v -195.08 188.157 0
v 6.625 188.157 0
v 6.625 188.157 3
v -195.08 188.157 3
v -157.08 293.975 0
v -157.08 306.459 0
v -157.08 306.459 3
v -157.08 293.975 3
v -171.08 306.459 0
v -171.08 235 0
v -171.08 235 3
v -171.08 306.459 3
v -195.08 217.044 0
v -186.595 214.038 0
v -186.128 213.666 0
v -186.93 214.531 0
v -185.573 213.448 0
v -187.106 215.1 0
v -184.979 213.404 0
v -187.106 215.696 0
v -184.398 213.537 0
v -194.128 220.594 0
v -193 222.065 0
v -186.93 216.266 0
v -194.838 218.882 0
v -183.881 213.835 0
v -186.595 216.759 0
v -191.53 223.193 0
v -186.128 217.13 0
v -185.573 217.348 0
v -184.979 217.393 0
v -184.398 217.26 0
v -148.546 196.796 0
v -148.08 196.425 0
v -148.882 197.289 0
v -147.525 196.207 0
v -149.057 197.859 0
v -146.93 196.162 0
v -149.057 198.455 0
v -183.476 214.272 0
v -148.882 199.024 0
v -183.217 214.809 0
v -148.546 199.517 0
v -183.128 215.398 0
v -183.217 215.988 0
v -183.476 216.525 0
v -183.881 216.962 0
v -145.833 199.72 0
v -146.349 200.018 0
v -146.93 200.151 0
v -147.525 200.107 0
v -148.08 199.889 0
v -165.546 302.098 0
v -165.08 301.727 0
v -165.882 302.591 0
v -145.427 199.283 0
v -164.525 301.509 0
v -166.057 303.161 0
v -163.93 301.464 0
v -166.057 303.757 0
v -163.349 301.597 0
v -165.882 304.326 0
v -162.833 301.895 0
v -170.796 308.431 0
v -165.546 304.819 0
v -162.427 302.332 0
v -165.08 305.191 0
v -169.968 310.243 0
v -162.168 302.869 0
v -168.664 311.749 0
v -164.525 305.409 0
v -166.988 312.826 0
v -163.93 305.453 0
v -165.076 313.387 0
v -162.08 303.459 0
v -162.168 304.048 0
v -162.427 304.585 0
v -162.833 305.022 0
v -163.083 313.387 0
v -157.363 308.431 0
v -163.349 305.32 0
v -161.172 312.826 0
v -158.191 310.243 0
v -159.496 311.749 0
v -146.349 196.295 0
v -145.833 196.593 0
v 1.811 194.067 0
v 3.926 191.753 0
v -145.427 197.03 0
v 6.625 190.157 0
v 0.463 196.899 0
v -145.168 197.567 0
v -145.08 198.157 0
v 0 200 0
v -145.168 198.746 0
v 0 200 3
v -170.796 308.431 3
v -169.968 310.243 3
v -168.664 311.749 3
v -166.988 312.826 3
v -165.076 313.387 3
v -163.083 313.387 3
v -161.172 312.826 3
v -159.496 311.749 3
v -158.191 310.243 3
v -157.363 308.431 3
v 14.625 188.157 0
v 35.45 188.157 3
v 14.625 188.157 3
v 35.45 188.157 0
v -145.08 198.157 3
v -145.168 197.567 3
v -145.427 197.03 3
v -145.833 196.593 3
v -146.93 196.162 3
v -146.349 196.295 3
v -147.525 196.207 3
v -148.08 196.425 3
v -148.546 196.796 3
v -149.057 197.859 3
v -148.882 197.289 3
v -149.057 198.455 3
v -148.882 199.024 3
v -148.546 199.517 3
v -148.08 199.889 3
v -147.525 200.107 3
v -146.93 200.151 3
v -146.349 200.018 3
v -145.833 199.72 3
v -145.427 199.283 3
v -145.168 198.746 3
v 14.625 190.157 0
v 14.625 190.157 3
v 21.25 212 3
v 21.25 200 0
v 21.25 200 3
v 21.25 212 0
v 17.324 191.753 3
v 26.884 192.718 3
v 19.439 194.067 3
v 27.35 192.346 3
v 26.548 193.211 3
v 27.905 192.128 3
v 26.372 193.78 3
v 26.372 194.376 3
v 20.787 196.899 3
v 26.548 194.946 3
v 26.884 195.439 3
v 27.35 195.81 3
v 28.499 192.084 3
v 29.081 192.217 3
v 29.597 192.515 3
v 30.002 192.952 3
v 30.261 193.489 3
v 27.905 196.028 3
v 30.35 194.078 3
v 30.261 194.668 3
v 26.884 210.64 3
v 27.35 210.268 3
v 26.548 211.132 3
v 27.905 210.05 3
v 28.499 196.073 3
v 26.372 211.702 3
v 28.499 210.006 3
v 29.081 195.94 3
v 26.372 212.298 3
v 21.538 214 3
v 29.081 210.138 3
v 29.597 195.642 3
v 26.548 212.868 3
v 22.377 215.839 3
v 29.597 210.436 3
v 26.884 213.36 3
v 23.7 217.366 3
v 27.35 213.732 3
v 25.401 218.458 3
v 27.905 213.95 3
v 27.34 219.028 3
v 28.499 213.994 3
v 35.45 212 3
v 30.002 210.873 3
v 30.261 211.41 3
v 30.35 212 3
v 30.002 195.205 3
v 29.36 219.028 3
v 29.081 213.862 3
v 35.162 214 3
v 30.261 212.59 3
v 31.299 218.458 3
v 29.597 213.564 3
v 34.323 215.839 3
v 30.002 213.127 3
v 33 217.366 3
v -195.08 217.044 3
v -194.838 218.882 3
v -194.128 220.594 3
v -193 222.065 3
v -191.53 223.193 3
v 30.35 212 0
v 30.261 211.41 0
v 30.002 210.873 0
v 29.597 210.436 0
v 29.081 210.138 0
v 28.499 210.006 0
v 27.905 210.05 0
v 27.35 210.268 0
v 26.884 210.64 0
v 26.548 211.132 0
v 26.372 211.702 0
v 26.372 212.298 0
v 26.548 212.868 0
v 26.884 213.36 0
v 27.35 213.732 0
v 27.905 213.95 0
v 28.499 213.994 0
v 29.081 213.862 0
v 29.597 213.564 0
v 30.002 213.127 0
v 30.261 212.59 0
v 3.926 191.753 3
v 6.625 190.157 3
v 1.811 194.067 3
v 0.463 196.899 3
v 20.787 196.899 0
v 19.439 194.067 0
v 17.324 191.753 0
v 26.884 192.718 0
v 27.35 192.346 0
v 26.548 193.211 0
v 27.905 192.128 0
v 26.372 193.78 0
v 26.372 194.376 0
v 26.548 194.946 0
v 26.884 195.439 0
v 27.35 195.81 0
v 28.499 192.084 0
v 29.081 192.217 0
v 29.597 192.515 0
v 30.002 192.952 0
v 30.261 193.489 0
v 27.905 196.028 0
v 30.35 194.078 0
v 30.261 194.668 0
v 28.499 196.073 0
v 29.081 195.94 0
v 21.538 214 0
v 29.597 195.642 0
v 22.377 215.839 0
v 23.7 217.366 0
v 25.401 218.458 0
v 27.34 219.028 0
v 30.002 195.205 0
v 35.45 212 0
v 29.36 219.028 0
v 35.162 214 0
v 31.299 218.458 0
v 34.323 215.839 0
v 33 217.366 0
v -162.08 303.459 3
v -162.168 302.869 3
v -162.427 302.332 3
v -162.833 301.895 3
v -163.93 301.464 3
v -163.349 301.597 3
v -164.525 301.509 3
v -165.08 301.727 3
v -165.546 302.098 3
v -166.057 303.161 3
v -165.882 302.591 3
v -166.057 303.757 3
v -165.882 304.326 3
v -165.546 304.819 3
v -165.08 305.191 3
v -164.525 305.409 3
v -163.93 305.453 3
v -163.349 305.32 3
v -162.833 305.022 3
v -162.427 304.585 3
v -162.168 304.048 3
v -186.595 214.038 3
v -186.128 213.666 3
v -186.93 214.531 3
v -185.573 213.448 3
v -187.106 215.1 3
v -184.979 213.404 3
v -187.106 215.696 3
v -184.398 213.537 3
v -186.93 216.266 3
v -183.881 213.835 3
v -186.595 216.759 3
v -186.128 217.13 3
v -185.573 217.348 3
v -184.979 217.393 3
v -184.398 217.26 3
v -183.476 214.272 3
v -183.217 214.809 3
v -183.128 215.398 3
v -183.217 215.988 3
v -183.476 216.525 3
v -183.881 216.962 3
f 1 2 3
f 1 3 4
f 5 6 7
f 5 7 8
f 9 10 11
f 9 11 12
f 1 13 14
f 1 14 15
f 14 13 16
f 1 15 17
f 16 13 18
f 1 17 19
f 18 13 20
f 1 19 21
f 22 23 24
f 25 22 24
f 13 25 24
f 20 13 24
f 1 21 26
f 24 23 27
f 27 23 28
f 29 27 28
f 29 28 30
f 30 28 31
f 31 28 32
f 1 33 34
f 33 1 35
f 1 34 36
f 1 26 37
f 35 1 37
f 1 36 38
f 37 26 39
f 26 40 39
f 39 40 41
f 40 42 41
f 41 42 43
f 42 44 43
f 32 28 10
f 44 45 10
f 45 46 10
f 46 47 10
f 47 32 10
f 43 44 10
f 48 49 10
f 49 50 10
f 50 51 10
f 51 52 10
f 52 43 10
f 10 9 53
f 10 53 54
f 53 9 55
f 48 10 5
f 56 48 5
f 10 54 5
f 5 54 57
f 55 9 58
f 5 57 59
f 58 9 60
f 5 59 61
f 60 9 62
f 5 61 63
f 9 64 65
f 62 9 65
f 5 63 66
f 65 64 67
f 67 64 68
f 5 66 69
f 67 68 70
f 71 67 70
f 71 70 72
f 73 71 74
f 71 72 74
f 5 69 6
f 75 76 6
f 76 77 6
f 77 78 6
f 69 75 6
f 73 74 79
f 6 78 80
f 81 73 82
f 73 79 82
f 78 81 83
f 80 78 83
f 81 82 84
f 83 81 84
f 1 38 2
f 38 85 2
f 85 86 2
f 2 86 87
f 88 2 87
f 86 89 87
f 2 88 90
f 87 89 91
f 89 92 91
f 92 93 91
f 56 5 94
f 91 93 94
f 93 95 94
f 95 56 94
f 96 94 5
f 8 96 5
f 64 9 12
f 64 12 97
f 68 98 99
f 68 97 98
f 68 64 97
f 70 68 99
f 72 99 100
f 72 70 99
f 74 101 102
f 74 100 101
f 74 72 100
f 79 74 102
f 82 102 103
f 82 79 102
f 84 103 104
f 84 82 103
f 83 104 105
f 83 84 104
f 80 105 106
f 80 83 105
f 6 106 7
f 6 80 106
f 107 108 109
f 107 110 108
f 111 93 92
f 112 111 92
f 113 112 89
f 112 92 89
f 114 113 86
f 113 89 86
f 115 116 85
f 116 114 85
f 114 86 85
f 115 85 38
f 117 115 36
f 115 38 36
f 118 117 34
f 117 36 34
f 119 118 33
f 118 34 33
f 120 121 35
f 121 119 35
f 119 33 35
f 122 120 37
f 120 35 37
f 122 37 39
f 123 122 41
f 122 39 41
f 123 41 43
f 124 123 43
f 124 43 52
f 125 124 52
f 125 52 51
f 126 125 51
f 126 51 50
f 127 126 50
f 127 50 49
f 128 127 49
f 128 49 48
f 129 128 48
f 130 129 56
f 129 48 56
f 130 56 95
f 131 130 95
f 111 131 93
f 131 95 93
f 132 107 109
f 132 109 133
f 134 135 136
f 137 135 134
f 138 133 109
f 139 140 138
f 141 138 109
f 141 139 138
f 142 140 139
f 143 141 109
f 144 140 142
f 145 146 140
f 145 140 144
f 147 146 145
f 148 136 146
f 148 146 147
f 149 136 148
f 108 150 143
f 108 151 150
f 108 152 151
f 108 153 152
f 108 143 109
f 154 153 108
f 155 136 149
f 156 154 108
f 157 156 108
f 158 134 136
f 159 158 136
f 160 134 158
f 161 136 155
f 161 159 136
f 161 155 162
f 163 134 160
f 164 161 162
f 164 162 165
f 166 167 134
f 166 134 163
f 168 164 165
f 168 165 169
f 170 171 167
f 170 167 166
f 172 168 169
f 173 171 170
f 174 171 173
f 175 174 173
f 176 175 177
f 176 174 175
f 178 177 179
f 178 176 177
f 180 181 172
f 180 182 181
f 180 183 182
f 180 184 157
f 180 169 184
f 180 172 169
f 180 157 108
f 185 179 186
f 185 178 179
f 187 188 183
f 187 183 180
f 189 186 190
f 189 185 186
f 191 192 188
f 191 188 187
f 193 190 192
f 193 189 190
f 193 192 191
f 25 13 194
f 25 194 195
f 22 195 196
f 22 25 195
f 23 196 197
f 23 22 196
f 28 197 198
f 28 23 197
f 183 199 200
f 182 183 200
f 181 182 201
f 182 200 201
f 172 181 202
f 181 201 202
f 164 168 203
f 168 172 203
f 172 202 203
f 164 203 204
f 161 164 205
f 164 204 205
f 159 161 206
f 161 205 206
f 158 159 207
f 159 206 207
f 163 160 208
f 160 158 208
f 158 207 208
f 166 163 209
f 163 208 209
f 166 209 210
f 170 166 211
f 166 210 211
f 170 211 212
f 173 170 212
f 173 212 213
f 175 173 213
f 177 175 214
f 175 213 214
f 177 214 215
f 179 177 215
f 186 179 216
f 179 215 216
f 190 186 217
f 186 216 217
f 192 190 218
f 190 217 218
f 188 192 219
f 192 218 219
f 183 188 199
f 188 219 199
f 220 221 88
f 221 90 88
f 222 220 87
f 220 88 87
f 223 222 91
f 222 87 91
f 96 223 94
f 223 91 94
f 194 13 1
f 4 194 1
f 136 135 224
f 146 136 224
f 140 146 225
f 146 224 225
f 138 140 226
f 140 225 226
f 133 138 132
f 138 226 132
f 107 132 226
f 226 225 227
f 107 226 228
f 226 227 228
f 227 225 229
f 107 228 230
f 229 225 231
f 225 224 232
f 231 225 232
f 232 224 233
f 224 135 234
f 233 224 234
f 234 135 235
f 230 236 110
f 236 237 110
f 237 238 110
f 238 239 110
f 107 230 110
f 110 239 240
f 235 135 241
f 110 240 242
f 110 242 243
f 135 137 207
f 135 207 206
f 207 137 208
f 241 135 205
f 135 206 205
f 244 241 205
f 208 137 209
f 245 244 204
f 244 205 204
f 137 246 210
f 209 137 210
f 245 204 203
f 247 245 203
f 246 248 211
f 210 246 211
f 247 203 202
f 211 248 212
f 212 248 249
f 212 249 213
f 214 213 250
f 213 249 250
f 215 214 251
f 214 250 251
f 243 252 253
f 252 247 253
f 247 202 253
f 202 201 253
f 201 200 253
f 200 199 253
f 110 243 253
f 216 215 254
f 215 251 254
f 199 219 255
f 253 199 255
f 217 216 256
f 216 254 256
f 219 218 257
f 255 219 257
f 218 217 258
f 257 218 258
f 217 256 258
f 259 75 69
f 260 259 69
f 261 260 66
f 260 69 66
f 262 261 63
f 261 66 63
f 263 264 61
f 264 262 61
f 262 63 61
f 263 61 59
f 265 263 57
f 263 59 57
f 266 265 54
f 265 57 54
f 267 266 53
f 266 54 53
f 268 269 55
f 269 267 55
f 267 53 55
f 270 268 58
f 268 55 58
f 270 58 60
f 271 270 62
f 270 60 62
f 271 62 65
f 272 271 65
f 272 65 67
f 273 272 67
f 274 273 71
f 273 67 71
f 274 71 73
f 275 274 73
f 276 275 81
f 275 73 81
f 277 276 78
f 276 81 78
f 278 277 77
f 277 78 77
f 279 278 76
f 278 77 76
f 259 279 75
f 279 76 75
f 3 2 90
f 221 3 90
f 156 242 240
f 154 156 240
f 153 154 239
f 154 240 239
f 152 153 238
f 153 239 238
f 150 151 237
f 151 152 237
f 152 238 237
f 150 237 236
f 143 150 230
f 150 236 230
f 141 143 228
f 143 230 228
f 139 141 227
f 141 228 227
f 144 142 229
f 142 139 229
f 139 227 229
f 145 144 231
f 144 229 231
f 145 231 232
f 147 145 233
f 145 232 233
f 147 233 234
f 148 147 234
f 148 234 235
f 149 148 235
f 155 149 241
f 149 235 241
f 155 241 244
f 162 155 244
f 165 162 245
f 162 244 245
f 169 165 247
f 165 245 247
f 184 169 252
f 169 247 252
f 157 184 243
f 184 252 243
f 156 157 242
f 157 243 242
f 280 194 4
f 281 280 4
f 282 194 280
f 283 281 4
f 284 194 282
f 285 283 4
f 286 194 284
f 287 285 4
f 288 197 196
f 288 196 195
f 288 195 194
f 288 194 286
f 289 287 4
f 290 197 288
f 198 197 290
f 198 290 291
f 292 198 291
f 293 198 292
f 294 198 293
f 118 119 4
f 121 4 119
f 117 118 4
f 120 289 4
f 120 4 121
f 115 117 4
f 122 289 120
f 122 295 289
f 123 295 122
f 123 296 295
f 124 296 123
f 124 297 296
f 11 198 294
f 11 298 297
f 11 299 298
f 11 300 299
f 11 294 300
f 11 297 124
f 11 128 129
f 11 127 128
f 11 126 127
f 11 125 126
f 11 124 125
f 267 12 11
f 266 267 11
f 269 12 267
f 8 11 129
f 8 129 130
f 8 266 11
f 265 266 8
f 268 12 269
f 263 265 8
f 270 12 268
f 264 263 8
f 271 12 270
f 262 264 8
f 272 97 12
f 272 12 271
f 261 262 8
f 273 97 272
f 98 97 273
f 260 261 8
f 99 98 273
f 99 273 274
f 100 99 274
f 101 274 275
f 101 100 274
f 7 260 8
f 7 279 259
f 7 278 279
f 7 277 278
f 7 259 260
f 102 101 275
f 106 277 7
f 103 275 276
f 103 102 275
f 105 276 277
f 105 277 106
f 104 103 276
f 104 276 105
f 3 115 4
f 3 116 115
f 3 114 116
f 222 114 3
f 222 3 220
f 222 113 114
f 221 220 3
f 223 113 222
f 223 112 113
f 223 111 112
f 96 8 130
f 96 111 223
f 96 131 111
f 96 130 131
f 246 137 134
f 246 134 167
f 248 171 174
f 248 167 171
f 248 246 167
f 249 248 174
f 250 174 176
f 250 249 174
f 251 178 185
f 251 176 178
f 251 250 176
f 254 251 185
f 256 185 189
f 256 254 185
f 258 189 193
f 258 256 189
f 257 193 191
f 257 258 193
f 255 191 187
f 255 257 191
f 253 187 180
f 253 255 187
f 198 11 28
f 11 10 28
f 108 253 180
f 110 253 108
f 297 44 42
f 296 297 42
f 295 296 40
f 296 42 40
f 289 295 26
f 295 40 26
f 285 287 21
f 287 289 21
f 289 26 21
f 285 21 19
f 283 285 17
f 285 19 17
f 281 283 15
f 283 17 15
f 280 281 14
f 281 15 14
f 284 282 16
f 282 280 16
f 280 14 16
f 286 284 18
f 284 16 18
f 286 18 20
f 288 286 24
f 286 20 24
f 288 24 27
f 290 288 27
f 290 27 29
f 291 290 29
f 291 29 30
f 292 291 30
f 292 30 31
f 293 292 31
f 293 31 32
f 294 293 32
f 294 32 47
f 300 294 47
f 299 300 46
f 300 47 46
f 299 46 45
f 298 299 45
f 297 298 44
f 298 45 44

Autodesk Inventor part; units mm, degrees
ref_plane "YZ Plane" through (0, 0, 0) normal (1, 0, 0) x (0, 1, 0)
ref_plane "XZ Plane" through (0, 0, 0) normal (0, 1, 0) x (-1, 0, 0)
ref_plane "XY Plane" through (0, 0, 0) normal (0, 0, 1) x (1, 0, 0)
sketch "Sketch3" plane through (0, 0, 0) normal (0, 0, 1) x (1, 0, 0)
  circle A0 centre (367.816, 50) radius 50 construction
  line L0 (367.816, 0) -> (512.7041, 0) construction
  line L1 (367.816, 50) -> (512.7041, 50) construction
  line L2 (367.816, 100) -> (512.7041, 100) construction
  line L3 (367.816, 50) -> (342.816, 6.6987) construction
  line L4 (367.816, 50) -> (324.5147, 25) construction
  line L5 (367.816, 50) -> (324.5147, 75) construction
  line L6 (342.816, 93.3013) -> (367.816, 50) construction
  line L7 (392.816, 93.3013) -> (367.816, 50) construction
  line L8 (411.1173, 75) -> (367.816, 50) construction
  line L9 (411.1173, 25) -> (367.816, 50) construction
  line L10 (392.816, 6.6987) -> (367.816, 50) construction
  line L11 (367.816, 0) -> (367.816, 100) construction
  line L12 (417.816, 50) -> (367.816, 50) construction
  line L13 (341.6361, 0) -> (341.6361, 100) construction
  line L14 (315.4561, 0) -> (315.4561, 100) construction
  line L15 (289.2762, 0) -> (289.2762, 100) construction
  line L16 (263.0963, 0) -> (263.0963, 100) construction
  line L17 (236.9163, 0) -> (236.9163, 100) construction
  line L18 (210.7364, 0) -> (210.7364, 100) construction
  line L19 (184.5564, 0) -> (184.5564, 100) construction
  line L20 (158.3765, 0) -> (158.3765, 100) construction
  circle A1 centre (315.4561, 50) radius 50 construction
  circle A2 centre (341.6361, 50) radius 50 construction
  circle A3 centre (289.2762, 50) radius 50 construction
  circle A4 centre (263.0963, 50) radius 50 construction
  circle A5 centre (236.9163, 50) radius 50 construction
  circle A6 centre (210.7364, 50) radius 50 construction
  line L21 (392.816, 6.6987) -> (512.7041, 6.6987) construction
  line L22 (411.1173, 25) -> (512.7041, 25) construction
  line L23 (411.1173, 75) -> (512.7041, 75) construction
  line L24 (411.1173, 75) -> (512.7041, 75) construction
  line L25 (392.816, 93.3013) -> (512.7041, 93.3013) construction
  line L26 (358.7574, 75) -> (339.2762, 50) construction
  line L27 (339.2762, 50) -> (306.3975, 25) construction
  line L28 (306.3975, 25) -> (261.9163, 6.6987) construction
  line L29 (261.9163, 6.6987) -> (210.7364, 0) construction
  line L30 (105.3682, -12.9392) -> (105.3682, 124.4333) construction
  line L31 (21.25, 0) -> (21.25, 12)
  line L32 (35.45, 12) -> (35.45, -11.8433)
  arc A7 (0, 0) -> (6.625, -9.8433) centre (10.625, 0) ccw
  arc A8 (14.625, -9.8433) -> (21.25, 0) centre (10.625, 0) ccw
  line L33 (35.45, -11.8433) -> (14.625, -11.8433)
  line L34 (6.625, -11.8433) -> (-195.0796, -11.8433)
  circle A9 centre (-144.26, 100.8473) radius 12.875 construction
  line L35 (6.625, -11.8433) -> (6.625, -9.8433)
  line L36 (14.625, -11.8433) -> (14.625, -9.8433)
  line L37 (411.1173, 75) -> (158.3765, 75) construction
  line L38 (367.816, 100) -> (158.3765, 100) construction
  line L39 (417.816, 50) -> (158.3765, 50) construction
  line L40 (411.1173, 25) -> (158.3765, 25) construction
  line L41 (392.816, 6.6987) -> (158.3765, 6.6987) construction
  line L42 (392.816, 93.3013) -> (158.3765, 93.3013) construction
  line L43 (358.7574, 75) -> (366.6361, 93.3013) construction
  line L44 (366.6361, 93.3013) -> (367.816, 100) construction
  spline S0 degree 4 poles (-157.0796, 100) (-157.0796, 88.9946) (-147.011, 72.6811) (-131.8577, 48.7932) (-88.4777, 17.6268) (-50.0176, 3.937) (-18.8717, 0) (0, 0) knots 0 0 0 0 0 0.264547 0.457223 0.66608 1 1 1 1 1
  line L45 (-157.0796, 100) -> (-157.0796, 38) construction
  line L46 (0, 0) -> (-157.0796, 0) construction
  line L47 (-144.26, 100.8473) -> (-157.135, 100.8473) construction
  circle A10 centre (-146.4546, 100) radius 10.625 construction
  line L48 (-146.4546, 100) -> (-157.0796, 100) construction
  line L49 (-141.0754, 84.4005) -> (-135.6205, 93.5183) construction
  line L50 (-141.0796, 132.0528) -> (-171.0796, 149.3733) construction
  line L51 (-171.0796, 149.3733) -> (-201.0796, 132.0528) construction
  line L52 (-141.0754, 84.4005) -> (-99.2801, 84.4005) construction
  line L53 (-201.0796, 132.0528) -> (-201.0796, 97.4118) construction
  line L54 (-201.0796, 97.4118) -> (-171.0796, 80.0913) construction
  line L55 (0, 0) -> (-157.0796, 93.9753) construction
  line L56 (-135.6205, 93.5183) -> (-137.3368, 94.5451) construction
  line L57 (-137.3368, 94.5451) -> (-143.2815, 84.6085) construction
  line L58 (-137.3368, 94.5451) -> (-171.0796, 114.7323) construction
  line L59 (-201.0796, 132.0528) -> (-171.0796, 114.7323) construction
  arc A11 (-137.3368, 94.5451) -> (-144.7045, 143.8948) centre (-171.0796, 114.7323) ccw construction
  arc A12 (-142.7917, 85.4273) -> (-147.1443, 147.6882) centre (-171.0796, 114.7323) ccw construction
  line L60 (-171.0796, 80.0913) -> (-171.0796, 35)
  circle A13 centre (-171.0796, 114.7323) radius 2.5 construction
  arc A14 (-167.4345, 120.8251) -> (-174.7248, 108.6394) centre (-171.0796, 114.7323) ccw construction
  line L61 (-167.4345, 120.8251) -> (-157.0796, 114.6302) construction
  line L62 (-171.0796, 80.0913) -> (-171.0796, 106.4587)
  line L63 (-171.0796, 106.4587) -> (-174.7248, 108.6394) construction
  line L64 (-171.0796, 35) -> (-191.5296, 23.1932)
  arc A15 (-191.5296, 23.1932) -> (-195.0796, 17.0444) centre (-187.9796, 17.0444) ccw
  line L65 (-195.0796, 17.0444) -> (-195.0796, -11.8433)
  arc A16 (35.45, 12) -> (21.25, 12) centre (28.35, 12) ccw
  line L66 (-157.0796, 114.6302) -> (-157.0796, 99.9865) construction
  circle A17 centre (-164.0796, 103.4587) radius 2
  line L67 (-171.0796, 103.4587) -> (-157.0796, 103.4587) construction
  circle A18 centre (-185.1284, 15.3983) radius 2
  line L68 (-185.1284, 15.3983) -> (-194.1284, 20.5944) construction
  circle A19 centre (-6, -5.9217) radius 2
  line L69 (-6, -11.8433) -> (-6, 0) construction
  circle A20 centre (28.35, 12) radius 2
  circle A21 centre (28.35, -5.9217) radius 2
  line L70 (-167.4345, 320.8251) -> (-157.0796, 314.6302) construction
  arc A22 (-167.4345, 320.8251) -> (-174.7248, 308.6394) centre (-171.0796, 314.7323) ccw construction
  circle A23 centre (-171.0796, 314.7323) radius 2.5 construction
  line L71 (-171.0796, 280.0913) -> (-171.0796, 306.4587)
  line L72 (-171.0796, 306.4587) -> (-174.7248, 308.6394) construction
  line L73 (-157.0796, 314.6302) -> (-157.0796, 299.9865) construction
  circle A24 centre (-164.0796, 303.4587) radius 2
  spline S1 degree 4 poles (-157.0796, 300) (-157.0796, 288.9946) (-147.0234, 272.6841) (-124.1789, 236.7977) (-70.8039, 208.0704) (-31.8865, 200.2943) (0, 200) knots 0 0 0 0 0 0.264547 0.457223 1 1 1 1 1 construction
  line L74 (-157.0796, 300) -> (-157.0796, 238) construction
  arc A25 (0, 200) -> (6.625, 190.1567) centre (10.625, 200) ccw
  line L75 (35.45, 212) -> (35.45, 188.1567)
  circle A26 centre (28.35, 212) radius 2
  circle A27 centre (28.35, 194.0783) radius 2
  arc A28 (35.45, 212) -> (21.25, 212) centre (28.35, 212) ccw
  line L76 (21.25, 200) -> (21.25, 212)
  line L77 (35.45, 188.1567) -> (14.625, 188.1567)
  arc A29 (14.625, 190.1567) -> (21.25, 200) centre (10.625, 200) ccw
  line L78 (14.625, 188.1567) -> (14.625, 190.1567)
  line L79 (-185.1284, 215.3983) -> (-194.1284, 220.5944) construction
  arc A30 (-191.5296, 223.1932) -> (-195.0796, 217.0444) centre (-187.9796, 217.0444) ccw
  line L80 (-195.0796, 217.0444) -> (-195.0796, 188.1567)
  line L81 (-171.0796, 235) -> (-191.5296, 223.1932)
  circle A31 centre (-185.1284, 215.3983) radius 2
  line L82 (-171.0796, 280.0913) -> (-171.0796, 235)
  line L83 (6.625, 188.1567) -> (-195.0796, 188.1567)
  line L84 (6.625, 188.1567) -> (6.625, 190.1567)
  line L85 (-137.3368, 294.5451) -> (-143.2815, 284.6085) construction
  line L86 (-141.0754, 284.4005) -> (-135.6205, 293.5183) construction
  line L87 (0, 200) -> (-157.0796, 293.9753)
  line L88 (-167.4345, 520.8251) -> (-157.0796, 514.6302) construction
  arc A32 (-167.4345, 520.8251) -> (-174.7248, 508.6394) centre (-171.0796, 514.7323) ccw construction
  circle A33 centre (-171.0796, 514.7323) radius 2.5 construction
  line L89 (-171.0796, 480.0913) -> (-171.0796, 506.4587)
  line L90 (-171.0796, 506.4587) -> (-174.7248, 508.6394) construction
  line L91 (-157.0796, 514.6302) -> (-157.0796, 499.9865) construction
  circle A34 centre (-164.0796, 503.4587) radius 2
  spline S2 degree 4 poles (-157.0796, 500) (-157.0796, 488.9946) (-147.0234, 472.6841) (-124.1789, 436.7977) (-70.8039, 408.0704) (-31.8865, 400.2943) (0, 400) knots 0 0 0 0 0 0.264547 0.457223 1 1 1 1 1 construction
  line L92 (-157.0796, 500) -> (-157.0796, 438)
  arc A35 (0, 400) -> (6.625, 390.1567) centre (10.625, 400) ccw
  line L93 (35.45, 412) -> (35.45, 388.1567)
  circle A36 centre (28.35, 412) radius 2
  circle A37 centre (28.35, 394.0783) radius 2
  arc A38 (35.45, 412) -> (21.25, 412) centre (28.35, 412) ccw
  line L94 (21.25, 400) -> (21.25, 412)
  line L95 (35.45, 388.1567) -> (14.625, 388.1567)
  arc A39 (14.625, 390.1567) -> (21.25, 400) centre (10.625, 400) ccw
  line L96 (14.625, 388.1567) -> (14.625, 390.1567)
  line L97 (-185.1284, 415.3983) -> (-194.1284, 420.5944) construction
  arc A40 (-191.5296, 423.1932) -> (-195.0796, 417.0444) centre (-187.9796, 417.0444) ccw
  line L98 (-195.0796, 417.0444) -> (-195.0796, 388.1567)
  line L99 (-171.0796, 435) -> (-191.5296, 423.1932)
  circle A41 centre (-185.1284, 415.3983) radius 2
  line L100 (-171.0796, 480.0913) -> (-171.0796, 435)
  line L101 (6.625, 388.1567) -> (-195.0796, 388.1567)
  line L102 (6.625, 388.1567) -> (6.625, 390.1567)
  line L103 (-137.3368, 494.5451) -> (-143.2815, 484.6085) construction
  line L104 (-141.0754, 484.4005) -> (-135.6205, 493.5183) construction
  line L105 (0, 400) -> (-157.0796, 493.9753) construction
  line L106 (-467.4345, 120.8251) -> (-457.0796, 114.6302) construction
  arc A42 (-467.4345, 120.8251) -> (-474.7248, 108.6394) centre (-471.0796, 114.7323) ccw construction
  circle A43 centre (-471.0796, 114.7323) radius 2.5 construction
  line L107 (-471.0796, 80.0913) -> (-471.0796, 106.4587)
  line L108 (-471.0796, 106.4587) -> (-474.7248, 108.6394) construction
  line L109 (-457.0796, 114.6302) -> (-457.0796, 99.9865) construction
  circle A44 centre (-464.0796, 103.4587) radius 2
  spline S3 degree 4 poles (-457.0796, 100) (-457.0796, 88.9946) (-447.0234, 72.6841) (-424.1789, 36.7977) (-370.8039, 8.0704) (-331.8865, 0.2943) (-300, 0) knots 0 0 0 0 0 0.264547 0.457223 1 1 1 1 1 construction
  line L110 (-457.0796, 100) -> (-457.0796, 38) construction
  arc A45 (-300, 0) -> (-293.375, -9.8433) centre (-289.375, 0) ccw construction
  line L111 (-264.55, 12) -> (-264.55, -11.8433)
  circle A46 centre (-271.65, 12) radius 2
  circle A47 centre (-271.65, -5.9217) radius 2
  arc A48 (-264.55, 12) -> (-278.75, 12) centre (-271.65, 12) ccw
  line L112 (-278.75, 0) -> (-278.75, 12) construction
  line L113 (-264.55, -11.8433) -> (-285.375, -11.8433)
  arc A49 (-285.375, -9.8433) -> (-278.75, 0) centre (-289.375, 0) ccw construction
  line L114 (-285.375, -11.8433) -> (-285.375, -9.8433) construction
  line L115 (-485.1284, 15.3983) -> (-494.1284, 20.5944) construction
  arc A50 (-491.5296, 23.1932) -> (-495.0796, 17.0444) centre (-487.9796, 17.0444) ccw
  line L116 (-495.0796, 17.0444) -> (-495.0796, -11.8433)
  line L117 (-471.0796, 35) -> (-491.5296, 23.1932)
  circle A51 centre (-485.1284, 15.3983) radius 2
  line L118 (-471.0796, 80.0913) -> (-471.0796, 35)
  line L119 (-293.375, -11.8433) -> (-495.0796, -11.8433)
  line L120 (-293.375, -11.8433) -> (-293.375, -9.8433) construction
  line L121 (-437.3368, 94.5451) -> (-443.2815, 84.6085) construction
  line L122 (-441.0754, 84.4005) -> (-435.6205, 93.5183) construction
  line L123 (-300, 0) -> (-457.0796, 93.9753) construction
  line L124 (-467.4345, 320.8251) -> (-457.0796, 314.6302) construction
  arc A52 (-467.4345, 320.8251) -> (-474.7248, 308.6394) centre (-471.0796, 314.7323) ccw construction
  circle A53 centre (-471.0796, 314.7323) radius 2.5 construction
  line L125 (-471.0796, 280.0913) -> (-471.0796, 306.4587)
  line L126 (-471.0796, 306.4587) -> (-474.7248, 308.6394) construction
  line L127 (-457.0796, 314.6302) -> (-457.0796, 299.9865) construction
  circle A54 centre (-464.0796, 303.4587) radius 2
  spline S4 degree 4 poles (-457.0796, 300) (-457.0796, 288.9946) (-447.0234, 272.6841) (-424.1789, 236.7977) (-370.8039, 208.0704) (-331.8865, 200.2943) (-300, 200) knots 0 0 0 0 0 0.264547 0.457223 1 1 1 1 1 construction
  line L128 (-457.0796, 300) -> (-457.0796, 238) construction
  arc A55 (-300, 200) -> (-293.375, 190.1567) centre (-289.375, 200) ccw construction
  line L129 (-264.55, 212) -> (-264.55, 188.1567)
  circle A56 centre (-271.65, 212) radius 2
  circle A57 centre (-271.65, 194.0783) radius 2
  arc A58 (-264.55, 212) -> (-278.75, 212) centre (-271.65, 212) ccw
  line L130 (-278.75, 200) -> (-278.75, 212) construction
  line L131 (-264.55, 188.1567) -> (-285.375, 188.1567)
  arc A59 (-285.375, 190.1567) -> (-278.75, 200) centre (-289.375, 200) ccw construction
  line L132 (-285.375, 188.1567) -> (-285.375, 190.1567) construction
  line L133 (-485.1284, 215.3983) -> (-494.1284, 220.5944) construction
  arc A60 (-491.5296, 223.1932) -> (-495.0796, 217.0444) centre (-487.9796, 217.0444) ccw
  line L134 (-495.0796, 217.0444) -> (-495.0796, 188.1567)
  line L135 (-471.0796, 235) -> (-491.5296, 223.1932)
  circle A61 centre (-485.1284, 215.3983) radius 2
  line L136 (-471.0796, 280.0913) -> (-471.0796, 235)
  line L137 (-293.375, 188.1567) -> (-495.0796, 188.1567)
  line L138 (-293.375, 188.1567) -> (-293.375, 190.1567) construction
  line L139 (-437.3368, 294.5451) -> (-443.2815, 284.6085) construction
  line L140 (-441.0754, 284.4005) -> (-435.6205, 293.5183) construction
  line L141 (-300, 200) -> (-457.0796, 293.9753) construction
  line L142 (-467.4345, 520.8251) -> (-457.0796, 514.6302)
  arc A62 (-467.4345, 520.8251) -> (-474.7248, 508.6394) centre (-471.0796, 514.7323) ccw
  circle A63 centre (-471.0796, 514.7323) radius 2.5
  line L143 (-471.0796, 480.0913) -> (-471.0796, 506.4587)
  line L144 (-471.0796, 506.4587) -> (-474.7248, 508.6394)
  line L145 (-457.0796, 514.6302) -> (-457.0796, 499.9865)
  circle A64 centre (-464.0796, 503.4587) radius 2
  spline S5 degree 4 poles (-457.0796, 500) (-457.0796, 488.9946) (-447.0234, 472.6841) (-424.1789, 436.7977) (-370.8039, 408.0704) (-331.8865, 400.2943) (-300, 400) knots 0 0 0 0 0 0.264547 0.457223 1 1 1 1 1 construction
  line L146 (-457.0796, 500) -> (-457.0796, 438) construction
  arc A65 (-300, 400) -> (-293.375, 390.1567) centre (-289.375, 400) ccw construction
  line L147 (-264.55, 412) -> (-264.55, 388.1567) construction
  circle A66 centre (-271.65, 412) radius 2
  circle A67 centre (-271.65, 394.0783) radius 2
  arc A68 (-264.55, 412) -> (-278.75, 412) centre (-271.65, 412) ccw
  line L148 (-278.75, 400) -> (-278.75, 412) construction
  line L149 (-264.55, 388.1567) -> (-285.375, 388.1567)
  arc A69 (-285.375, 390.1567) -> (-278.75, 400) centre (-289.375, 400) ccw construction
  line L150 (-285.375, 388.1567) -> (-285.375, 390.1567) construction
  line L151 (-485.1284, 415.3983) -> (-494.1284, 420.5944) construction
  arc A70 (-491.5296, 423.1932) -> (-495.0796, 417.0444) centre (-487.9796, 417.0444) ccw
  line L152 (-495.0796, 417.0444) -> (-495.0796, 388.1567) construction
  line L153 (-471.0796, 435) -> (-491.5296, 423.1932)
  circle A71 centre (-485.1284, 415.3983) radius 2
  line L154 (-471.0796, 480.0913) -> (-471.0796, 435)
  line L155 (-293.375, 388.1567) -> (-495.0796, 388.1567)
  line L156 (-293.375, 388.1567) -> (-293.375, 390.1567) construction
  line L157 (-437.3368, 494.5451) -> (-443.2815, 484.6085) construction
  line L158 (-441.0754, 484.4005) -> (-435.6205, 493.5183) construction
  line L159 (-300, 400) -> (-457.0796, 493.9753) construction
  line L160 (-435.4304, 87.048) -> (-430.3073, 83.9831)
  line L161 (-430.3073, 83.9831) -> (-430.3073, 78.0131)
  line L162 (-457.0796, 100) -> (-443.128, 91.6532)
  line L163 (-443.2208, 85.684) -> (-443.128, 91.6532)
  line L164 (-440.6463, 84.1438) -> (-435.4304, 87.048)
  line L165 (-440.6463, 84.1438) -> (-443.2208, 85.684)
  line L166 (-430.3073, 78.0131) -> (-436.0283, 74.7101)
  line L167 (-436.0283, 74.7101) -> (-436.0283, 68.1041)
  spline S6 degree 4 poles (-439.3753, 72.7777) (-420.1522, 45.3403) (-398.6357, 22.4496) (-337.1208, 4.2654) (-300, 5.1701) knots 0 0 0 0 0 1 1 1 1 1
  line L168 (-293.375, -11.8433) -> (-285.375, -11.8433)
  line L169 (-157.0796, 293.9753) -> (-157.0796, 300)
  line L170 (-293.375, 188.1567) -> (-285.375, 188.1567)
  arc A72 (-157.0796, 438) -> (-119.0796, 400) centre (-119.0796, 438) ccw
  line L171 (-119.0796, 400) -> (0, 400)
  line L172 (-457.0796, 500) -> (-457.0796, 438) construction
  line L173 (-419.0796, 400) -> (-300, 400) construction
  arc A73 (-457.0796, 438) -> (-419.0796, 400) centre (-419.0796, 438) ccw construction
  line L174 (-457.0796, 300) -> (-443.128, 291.6532)
  line L175 (-443.2208, 285.684) -> (-443.128, 291.6532)
  line L176 (-440.6463, 284.1438) -> (-443.2208, 285.684)
  line L177 (-440.6463, 284.1438) -> (-435.4304, 287.048)
  line L178 (-435.4304, 287.048) -> (-430.3073, 283.9831)
  line L179 (-430.3073, 283.9831) -> (-430.3073, 278.0131) construction
  line L180 (-430.3073, 278.0131) -> (-436.0283, 274.7101) construction
  line L181 (-457.0796, 500) -> (-443.128, 491.6532)
  line L182 (-443.2208, 485.684) -> (-443.128, 491.6532)
  line L183 (-440.6463, 484.1438) -> (-443.2208, 485.684)
  line L184 (-440.6463, 484.1438) -> (-435.4304, 487.048)
  line L185 (-435.4304, 487.048) -> (-430.3073, 483.9831)
  line L186 (-430.3073, 483.9831) -> (-430.3073, 478.0131)
  line L187 (-430.3073, 478.0131) -> (-436.0283, 474.7101)
  line L188 (-430.3073, 283.9831) -> (-298.5715, 205.1701)
  line L189 (-293.375, 388.1567) -> (-285.375, 388.1567)
  line L190 (-300, 5.1701) -> (-285.5799, 5.1701)
  arc A74 (-285.5799, 5.1701) -> (-278.75, 12) centre (-285.5799, 12) ccw
  line L191 (-298.5715, 205.1701) -> (-285.5799, 205.1701)
  arc A75 (-285.5799, 205.1701) -> (-278.75, 212) centre (-285.5799, 212) ccw
  line L192 (-436.0283, 474.7101) -> (-451.9095, 465.5411)
  line L193 (-451.9095, 465.5411) -> (-451.9095, 438)
  arc A76 (-451.9095, 438) -> (-419.0796, 405.1701) centre (-419.0796, 438) ccw
  line L194 (-419.0796, 405.1701) -> (-285.5799, 405.1701)
  arc A77 (-285.5799, 405.1701) -> (-278.75, 412) centre (-285.5799, 412) ccw
  line L195 (-495.0796, 388.1567) -> (-514.2796, 388.1567)
  line L196 (-514.2796, 388.1567) -> (-514.2796, 392.1567)
  line L197 (-514.2796, 392.1567) -> (-498.0796, 392.1567)
  arc A78 (-498.0796, 392.1567) -> (-495.0796, 395.1567) centre (-498.0796, 395.1567) ccw
  line L198 (-495.0796, 395.1567) -> (-495.0796, 417.0444)
  line L199 (-499.0796, 388.1567) -> (-510.2796, 388.1567) construction
  line L200 (-510.2796, 388.1567) -> (-510.2796, 392.1567) construction
  line L201 (-510.2796, 392.1567) -> (-499.0796, 392.1567) construction
  line L202 (-499.0796, 392.1567) -> (-499.0796, 388.1567) construction
  line L203 (-499.0796, 388.1567) -> (-510.2796, 392.1567) construction
  line L204 (-510.2796, 388.1567) -> (-499.0796, 392.1567) construction
  arc A79 (-600, 200) -> (-593.375, 190.1567) centre (-589.375, 200) ccw construction
  line L205 (-564.55, 212) -> (-564.55, 188.1567) construction
  circle A80 centre (-571.65, 212) radius 2
  circle A81 centre (-571.65, 194.0783) radius 2
  arc A82 (-564.55, 212) -> (-578.75, 212) centre (-571.65, 212) ccw
  line L206 (-578.75, 200) -> (-578.75, 212) construction
  line L207 (-564.55, 188.1567) -> (-585.375, 188.1567)
  arc A83 (-585.375, 190.1567) -> (-578.75, 200) centre (-589.375, 200) ccw construction
  line L208 (-585.375, 188.1567) -> (-585.375, 190.1567) construction
  line L209 (-593.375, 188.1567) -> (-593.375, 190.1567) construction
  arc A84 (-585.5799, 205.1701) -> (-578.75, 212) centre (-585.5799, 212) ccw
  line L210 (-593.375, 188.1567) -> (-585.375, 188.1567)
  line L211 (-598.5715, 205.1701) -> (-585.5799, 205.1701)
  arc A85 (-791.5296, 223.1932) -> (-795.0796, 217.0444) centre (-787.9796, 217.0444) ccw
  line L212 (-785.1284, 215.3983) -> (-794.1284, 220.5944) construction
  circle A86 centre (-785.1284, 215.3983) radius 2
  line L213 (-771.0796, 235) -> (-791.5296, 223.1932)
  line L214 (-795.0796, 217.0444) -> (-795.0796, 188.1567) construction
  line L215 (-730.3073, 278.0131) -> (-736.0283, 274.7101) construction
  line L216 (-757.0796, 300) -> (-757.0796, 238) construction
  line L217 (-730.3073, 283.9831) -> (-730.3073, 278.0131) construction
  line L218 (-730.3073, 283.9831) -> (-598.5715, 205.1701)
  line L219 (-600, 200) -> (-757.0796, 293.9753) construction
  spline S7 degree 4 poles (-757.0796, 300) (-757.0796, 288.9946) (-747.0234, 272.6841) (-724.1789, 236.7977) (-670.8039, 208.0704) (-631.8865, 200.2943) (-600, 200) knots 0 0 0 0 0 0.264547 0.457223 1 1 1 1 1 construction
  line L220 (-593.375, 188.1567) -> (-795.0796, 188.1567)
  line L221 (-771.0796, 280.0913) -> (-771.0796, 235)
  line L222 (-757.0796, 300) -> (-743.128, 291.6532)
  line L223 (-743.2208, 285.684) -> (-743.128, 291.6532)
  line L224 (-740.6463, 284.1438) -> (-743.2208, 285.684)
  line L225 (-737.3368, 294.5451) -> (-743.2815, 284.6085) construction
  line L226 (-741.0754, 284.4005) -> (-735.6205, 293.5183) construction
  line L227 (-740.6463, 284.1438) -> (-735.4304, 287.048)
  line L228 (-735.4304, 287.048) -> (-730.3073, 283.9831)
  line L229 (-767.4345, 320.8251) -> (-757.0796, 314.6302)
  line L230 (-771.0796, 280.0913) -> (-771.0796, 306.4587)
  line L231 (-757.0796, 314.6302) -> (-757.0796, 299.9865)
  circle A87 centre (-764.0796, 303.4587) radius 2
  line L232 (-771.0796, 306.4587) -> (-774.7248, 308.6394)
  circle A88 centre (-771.0796, 314.7323) radius 2.5
  arc A89 (-767.4345, 320.8251) -> (-774.7248, 308.6394) centre (-771.0796, 314.7323) ccw
  line L233 (-795.0796, 188.1567) -> (-814.2796, 188.1567)
  line L234 (-814.2796, 188.1567) -> (-814.2796, 192.1567)
  line L235 (-814.2796, 192.1567) -> (-798.0796, 192.1567)
  arc A90 (-798.0796, 192.1567) -> (-795.0796, 195.1567) centre (-798.0796, 195.1567) ccw
  line L236 (-795.0796, 195.1567) -> (-795.0796, 217.0444)
  line L237 (-799.0796, 188.1567) -> (-810.2796, 188.1567) construction
  line L238 (-810.2796, 188.1567) -> (-810.2796, 192.1567) construction
  line L239 (-810.2796, 192.1567) -> (-799.0796, 192.1567) construction
  line L240 (-799.0796, 192.1567) -> (-799.0796, 188.1567) construction
  line L241 (-799.0796, 188.1567) -> (-810.2796, 192.1567) construction
  line L242 (-810.2796, 188.1567) -> (-799.0796, 192.1567) construction
  line L243 (-495.0796, 587.6927) -> (-264.55, 587.6927) construction
  line L244 (-379.8148, 587.6927) -> (-379.8148, 614.3146) construction
  line L245 (-795.0796, 438) -> (-564.55, 438) construction
  line L246 (-679.8148, 438) -> (-679.8148, 492.8294) construction
  arc A91 (-564.55, 195.1567) -> (-561.55, 192.1567) centre (-561.55, 195.1567) ccw
  line L247 (-545.35, 192.1567) -> (-561.55, 192.1567)
  line L248 (-545.35, 188.1567) -> (-545.35, 192.1567)
  line L249 (-560.55, 192.1567) -> (-560.55, 188.1567) construction
  line L250 (-560.55, 188.1567) -> (-549.35, 188.1567) construction
  line L251 (-564.55, 188.1567) -> (-545.35, 188.1567)
  line L252 (-549.35, 188.1567) -> (-549.35, 192.1567) construction
  line L253 (-549.35, 192.1567) -> (-560.55, 192.1567) construction
  line L254 (-560.55, 188.1567) -> (-549.35, 192.1567) construction
  line L255 (-549.35, 188.1567) -> (-560.55, 192.1567) construction
  line L256 (-564.55, 195.1567) -> (-564.55, 212)
  circle A92 centre (-147.0796, 398.1567) radius 2
  circle A93 centre (-147.0796, 198.1567) radius 2
  circle A94 centre (-147.0796, -1.8433) radius 2
  circle A95 centre (-447.0796, 398.1567) radius 2
  circle A96 centre (-447.0796, 198.1567) radius 2
  circle A97 centre (-447.0796, -1.8433) radius 2
  circle A98 centre (-747.0796, 398.1567) radius 2 construction
  circle A99 centre (-747.0796, 198.1567) radius 2
  circle A100 centre (-747.0796, -1.8433) radius 2 construction
  line L257 (-264.55, 388.1567) -> (-245.35, 388.1567)
  line L258 (-245.35, 388.1567) -> (-245.35, 392.1567)
  line L259 (-245.35, 392.1567) -> (-261.55, 392.1567)
  arc A101 (-264.55, 395.1567) -> (-261.55, 392.1567) centre (-261.55, 395.1567) ccw
  line L260 (-260.55, 388.1567) -> (-249.35, 388.1567) construction
  line L261 (-249.35, 388.1567) -> (-249.35, 392.1567) construction
  line L262 (-249.35, 392.1567) -> (-260.55, 392.1567) construction
  line L263 (-260.55, 392.1567) -> (-260.55, 388.1567) construction
  line L264 (-260.55, 388.1567) -> (-249.35, 392.1567) construction
  line L265 (-249.35, 388.1567) -> (-260.55, 392.1567) construction
  line L266 (-264.55, 412) -> (-264.55, 395.1567)
  arc A102 (-157.0796, 106.4587) -> (-171.0796, 106.4587) centre (-164.0796, 106.4587) ccw
  line L267 (-157.0796, 106.4587) -> (-157.0796, 100)
  arc A103 (-157.0796, 306.4587) -> (-171.0796, 306.4587) centre (-164.0796, 306.4587) ccw
  line L268 (-157.0796, 306.4587) -> (-157.0796, 300)
  arc A104 (-157.0796, 506.4587) -> (-171.0796, 506.4587) centre (-164.0796, 506.4587) ccw
  line L269 (-157.0796, 506.4587) -> (-157.0796, 500)
  arc A105 (-457.0796, 106.4587) -> (-471.0796, 106.4587) centre (-464.0796, 106.4587) ccw
  line L270 (-457.0796, 106.4587) -> (-457.0796, 100)
  arc A106 (-457.0796, 306.4587) -> (-471.0796, 306.4587) centre (-464.0796, 306.4587) ccw
  line L271 (-457.0796, 306.4587) -> (-457.0796, 300)
  arc A107 (-457.0796, 506.4587) -> (-471.0796, 506.4587) centre (-464.0796, 506.4587) ccw construction
  line L272 (-457.0796, 506.4587) -> (-457.0796, 500) construction
  point P0 (158.3765, 0)
  point P1 (-148.021, 75)
  point P2 (-128.5398, 50)
  point P3 (-95.6611, 25)
  point P4 (-51.1799, 6.6987)
  point P5 (-155.8997, 93.3013)
  point P6 (-148.021, 275)
  point P7 (-128.5398, 250)
  point P8 (-95.6611, 225)
  point P9 (-51.1799, 206.6987)
  point P10 (-157.0796, 303.4587)
  point P11 (-157.0796, 200)
  point P12 (-171.0796, 303.4587)
  point P13 (-6, 188.1567)
  point P14 (-142.7917, 285.4273)
  point P15 (-148.021, 475)
  point P16 (-128.5398, 450)
  point P17 (-95.6611, 425)
  point P18 (-51.1799, 406.6987)
  point P19 (-157.0796, 503.4587)
  point P20 (-157.0796, 400)
  point P21 (-171.0796, 503.4587)
  point P22 (-6, 388.1567)
  point P23 (-142.7917, 485.4273)
  point P24 (-448.021, 75)
  point P25 (-428.5398, 50)
  point P26 (-395.6611, 25)
  point P27 (-351.1799, 6.6987)
  point P28 (-457.0796, 103.4587)
  point P29 (-457.0796, 0)
  point P30 (-471.0796, 103.4587)
  point P31 (-306, -11.8433)
  point P32 (-442.7917, 85.4273)
  point P33 (-448.021, 275)
  point P34 (-428.5398, 250)
  point P35 (-395.6611, 225)
  point P36 (-351.1799, 206.6987)
  point P37 (-457.0796, 303.4587)
  point P38 (-457.0796, 200)
  point P39 (-471.0796, 303.4587)
  point P40 (-306, 188.1567)
  point P41 (-442.7917, 285.4273)
  point P42 (-448.021, 475)
  point P43 (-428.5398, 450)
  point P44 (-395.6611, 425)
  point P45 (-351.1799, 406.6987)
  point P46 (-457.0796, 503.4587)
  point P47 (-457.0796, 400)
  point P48 (-471.0796, 503.4587)
  point P49 (-306, 388.1567)
  point P50 (-442.7917, 485.4273)
  point P51 (-421.2258, 50.7726)
  point P52 (-392.6255, 29.6644)
  point P53 (-346.6709, 11.6004)
  point P54 (-436.0267, 68.102)
  point P55 (-457.0796, 503.4587)
  point P56 (-504.6796, 390.1567)
  point P57 (-606, 188.1567)
  point P58 (-757.0796, 200)
  point P59 (-748.021, 275)
  point P60 (-728.5398, 250)
  point P61 (-757.0796, 303.4587)
  point P62 (-695.6611, 225)
  point P63 (-651.1799, 206.6987)
  point P64 (-742.7917, 285.4273)
  point P65 (-771.0796, 303.4587)
  point P66 (-804.6796, 190.1567)
  point P67 (-564.55, 188.1567)
  point P68 (-554.95, 190.1567)
  point P69 (-254.95, 390.1567)
  dimension "d43" = 25.75
  dimension "diameter" = 100
  dimension "d8" = 26.1799
  dimension "d14" = 30
  dimension "d15" = 30
  dimension "d16" = 30
  dimension "d32" = 10.625
  dimension "d47" = 8
  dimension "d49" = 2
  dimension "d53" = 21.25
  dimension "d62" = 20.825
  dimension "d123" = 120
  dimension "d126" = 59.109
  dimension "d137" = 2
  dimension "d138" = 90
  dimension "d139" = 90
  dimension "d141" = 7.1
  dimension "d142" = 14
  dimension "d143" = 7.1
  dimension "d144" = 12
  dimension "d145" = 5
  dimension "d146" = 35
  dimension "d147" = 24
  dimension "hole" = 4
  dimension "d155" = 4
  dimension "d156" = 9
  dimension "d157" = 4
  dimension "d158" = 6
  dimension "d159" = 4
  dimension "d160" = 4
  dimension "d241" = 120.891
  dimension "d244" = 120
  dimension "d245" = 30
  dimension "d246" = 3
  dimension "d249" = 200
  dimension "d252" = 300
  dimension "d255" = 120
  dimension "d256" = 5.1701
  dimension "d259" = 0.5
  dimension "d260" = 0.5
  dimension "d261" = 120
  dimension "d262" = 120
  dimension "d264" = 5.1701
  dimension "d265" = 38
  dimension "d268" = 300
  dimension "d275" = 200
  dimension "d288" = 5.1701
  dimension "d289" = 5.1701
  dimension "d290" = 5.1701
  dimension "d291" = 5.1701
  dimension "d292" = 11.2
  dimension "d293" = 4
  dimension "d294" = 4
  dimension "d296" = 3
  dimension "d299" = 300
  dimension "d324" = 11.2
  dimension "d325" = 4
  dimension "d326" = 4
  dimension "d328" = 3
  dimension "d330" = 4
  dimension "d331" = 10
  dimension "d332" = 10
  dimension "d335" = 200
  dimension "d338" = 300
  dimension "d341" = 7.1
  dimension "d342" = 4.6
sketch "Sketch5" plane through (0, 0, 0) normal (0, 0, 1) x (1, 0, 0)
  circle A0 centre (-171.0796, 114.7323) radius 2
  arc A1 (-168.5126, 119.023) -> (-173.6466, 110.4415) centre (-171.0796, 114.7323) ccw construction
  line L0 (-173.6466, 110.4415) -> (-168.5126, 119.023) construction
  line L1 (-137.3368, 94.5451) -> (-171.0796, 114.7323) construction
  line L2 (-137.3368, 94.5451) -> (-143.2815, 84.6085) construction
  line L3 (-141.0754, 84.4005) -> (-135.6205, 93.5183) construction
  line L4 (-142.7917, 85.4273) -> (-141.0754, 84.4005) construction
  line L5 (-173.6466, 110.4415) -> (-138.1875, 89.2276) construction
  line L6 (-138.1875, 89.2276) -> (-133.0535, 97.8091)
  line L7 (-133.0535, 97.8091) -> (-168.5126, 119.023) construction
  line L8 (-159.6382, 113.7138) -> (-159.6382, 107.8873)
  line L9 (-159.6382, 107.8873) -> (-145.3456, 99.3365)
  line L10 (-133.0535, 97.8091) -> (-140.2116, 102.0915)
  line L11 (-152.4919, 103.6119) -> (-153.6918, 101.6062)
  line L12 (-140.2116, 102.0915) -> (-145.3456, 99.3365)
  line L13 (-159.6382, 113.7138) -> (-168.5126, 119.023)
  line L14 (-135.6205, 93.5183) -> (-169.3633, 113.7055) construction
  line L15 (-168.5126, 119.023) -> (-189.9664, 131.858)
  arc A2 (-189.9664, 131.858) -> (-195.1004, 123.2766) centre (-192.5334, 127.5673) ccw
  line L16 (-195.1004, 123.2766) -> (-173.6466, 110.4415)
  line L17 (-142.7917, 85.4273) -> (-141.0754, 84.4005)
  line L18 (-141.0754, 84.4005) -> (-138.1875, 89.2276)
  line L19 (-142.7917, 85.4273) -> (-142.6907, 91.9217)
  line L20 (-142.6907, 91.9217) -> (-173.6466, 110.4415)
  arc A3 (-141.0754, 84.4005) -> (-138.014, 141.6941) centre (-171.0796, 114.7323) ccw construction
  point P0 (0, 0)
  dimension "d346" = 4
  dimension "d347" = 3
  dimension "d356" = 25
  dimension "d357" = 120
extrude "Extrusion4" add sketch "Sketch3" along normal blind 3 contours L71 A103 L268 L169 L87 A25 L84 L83 L80 A30 L81 L82 | L75 L77 L78 A29 L76 A28
properties part number "2linepath"
